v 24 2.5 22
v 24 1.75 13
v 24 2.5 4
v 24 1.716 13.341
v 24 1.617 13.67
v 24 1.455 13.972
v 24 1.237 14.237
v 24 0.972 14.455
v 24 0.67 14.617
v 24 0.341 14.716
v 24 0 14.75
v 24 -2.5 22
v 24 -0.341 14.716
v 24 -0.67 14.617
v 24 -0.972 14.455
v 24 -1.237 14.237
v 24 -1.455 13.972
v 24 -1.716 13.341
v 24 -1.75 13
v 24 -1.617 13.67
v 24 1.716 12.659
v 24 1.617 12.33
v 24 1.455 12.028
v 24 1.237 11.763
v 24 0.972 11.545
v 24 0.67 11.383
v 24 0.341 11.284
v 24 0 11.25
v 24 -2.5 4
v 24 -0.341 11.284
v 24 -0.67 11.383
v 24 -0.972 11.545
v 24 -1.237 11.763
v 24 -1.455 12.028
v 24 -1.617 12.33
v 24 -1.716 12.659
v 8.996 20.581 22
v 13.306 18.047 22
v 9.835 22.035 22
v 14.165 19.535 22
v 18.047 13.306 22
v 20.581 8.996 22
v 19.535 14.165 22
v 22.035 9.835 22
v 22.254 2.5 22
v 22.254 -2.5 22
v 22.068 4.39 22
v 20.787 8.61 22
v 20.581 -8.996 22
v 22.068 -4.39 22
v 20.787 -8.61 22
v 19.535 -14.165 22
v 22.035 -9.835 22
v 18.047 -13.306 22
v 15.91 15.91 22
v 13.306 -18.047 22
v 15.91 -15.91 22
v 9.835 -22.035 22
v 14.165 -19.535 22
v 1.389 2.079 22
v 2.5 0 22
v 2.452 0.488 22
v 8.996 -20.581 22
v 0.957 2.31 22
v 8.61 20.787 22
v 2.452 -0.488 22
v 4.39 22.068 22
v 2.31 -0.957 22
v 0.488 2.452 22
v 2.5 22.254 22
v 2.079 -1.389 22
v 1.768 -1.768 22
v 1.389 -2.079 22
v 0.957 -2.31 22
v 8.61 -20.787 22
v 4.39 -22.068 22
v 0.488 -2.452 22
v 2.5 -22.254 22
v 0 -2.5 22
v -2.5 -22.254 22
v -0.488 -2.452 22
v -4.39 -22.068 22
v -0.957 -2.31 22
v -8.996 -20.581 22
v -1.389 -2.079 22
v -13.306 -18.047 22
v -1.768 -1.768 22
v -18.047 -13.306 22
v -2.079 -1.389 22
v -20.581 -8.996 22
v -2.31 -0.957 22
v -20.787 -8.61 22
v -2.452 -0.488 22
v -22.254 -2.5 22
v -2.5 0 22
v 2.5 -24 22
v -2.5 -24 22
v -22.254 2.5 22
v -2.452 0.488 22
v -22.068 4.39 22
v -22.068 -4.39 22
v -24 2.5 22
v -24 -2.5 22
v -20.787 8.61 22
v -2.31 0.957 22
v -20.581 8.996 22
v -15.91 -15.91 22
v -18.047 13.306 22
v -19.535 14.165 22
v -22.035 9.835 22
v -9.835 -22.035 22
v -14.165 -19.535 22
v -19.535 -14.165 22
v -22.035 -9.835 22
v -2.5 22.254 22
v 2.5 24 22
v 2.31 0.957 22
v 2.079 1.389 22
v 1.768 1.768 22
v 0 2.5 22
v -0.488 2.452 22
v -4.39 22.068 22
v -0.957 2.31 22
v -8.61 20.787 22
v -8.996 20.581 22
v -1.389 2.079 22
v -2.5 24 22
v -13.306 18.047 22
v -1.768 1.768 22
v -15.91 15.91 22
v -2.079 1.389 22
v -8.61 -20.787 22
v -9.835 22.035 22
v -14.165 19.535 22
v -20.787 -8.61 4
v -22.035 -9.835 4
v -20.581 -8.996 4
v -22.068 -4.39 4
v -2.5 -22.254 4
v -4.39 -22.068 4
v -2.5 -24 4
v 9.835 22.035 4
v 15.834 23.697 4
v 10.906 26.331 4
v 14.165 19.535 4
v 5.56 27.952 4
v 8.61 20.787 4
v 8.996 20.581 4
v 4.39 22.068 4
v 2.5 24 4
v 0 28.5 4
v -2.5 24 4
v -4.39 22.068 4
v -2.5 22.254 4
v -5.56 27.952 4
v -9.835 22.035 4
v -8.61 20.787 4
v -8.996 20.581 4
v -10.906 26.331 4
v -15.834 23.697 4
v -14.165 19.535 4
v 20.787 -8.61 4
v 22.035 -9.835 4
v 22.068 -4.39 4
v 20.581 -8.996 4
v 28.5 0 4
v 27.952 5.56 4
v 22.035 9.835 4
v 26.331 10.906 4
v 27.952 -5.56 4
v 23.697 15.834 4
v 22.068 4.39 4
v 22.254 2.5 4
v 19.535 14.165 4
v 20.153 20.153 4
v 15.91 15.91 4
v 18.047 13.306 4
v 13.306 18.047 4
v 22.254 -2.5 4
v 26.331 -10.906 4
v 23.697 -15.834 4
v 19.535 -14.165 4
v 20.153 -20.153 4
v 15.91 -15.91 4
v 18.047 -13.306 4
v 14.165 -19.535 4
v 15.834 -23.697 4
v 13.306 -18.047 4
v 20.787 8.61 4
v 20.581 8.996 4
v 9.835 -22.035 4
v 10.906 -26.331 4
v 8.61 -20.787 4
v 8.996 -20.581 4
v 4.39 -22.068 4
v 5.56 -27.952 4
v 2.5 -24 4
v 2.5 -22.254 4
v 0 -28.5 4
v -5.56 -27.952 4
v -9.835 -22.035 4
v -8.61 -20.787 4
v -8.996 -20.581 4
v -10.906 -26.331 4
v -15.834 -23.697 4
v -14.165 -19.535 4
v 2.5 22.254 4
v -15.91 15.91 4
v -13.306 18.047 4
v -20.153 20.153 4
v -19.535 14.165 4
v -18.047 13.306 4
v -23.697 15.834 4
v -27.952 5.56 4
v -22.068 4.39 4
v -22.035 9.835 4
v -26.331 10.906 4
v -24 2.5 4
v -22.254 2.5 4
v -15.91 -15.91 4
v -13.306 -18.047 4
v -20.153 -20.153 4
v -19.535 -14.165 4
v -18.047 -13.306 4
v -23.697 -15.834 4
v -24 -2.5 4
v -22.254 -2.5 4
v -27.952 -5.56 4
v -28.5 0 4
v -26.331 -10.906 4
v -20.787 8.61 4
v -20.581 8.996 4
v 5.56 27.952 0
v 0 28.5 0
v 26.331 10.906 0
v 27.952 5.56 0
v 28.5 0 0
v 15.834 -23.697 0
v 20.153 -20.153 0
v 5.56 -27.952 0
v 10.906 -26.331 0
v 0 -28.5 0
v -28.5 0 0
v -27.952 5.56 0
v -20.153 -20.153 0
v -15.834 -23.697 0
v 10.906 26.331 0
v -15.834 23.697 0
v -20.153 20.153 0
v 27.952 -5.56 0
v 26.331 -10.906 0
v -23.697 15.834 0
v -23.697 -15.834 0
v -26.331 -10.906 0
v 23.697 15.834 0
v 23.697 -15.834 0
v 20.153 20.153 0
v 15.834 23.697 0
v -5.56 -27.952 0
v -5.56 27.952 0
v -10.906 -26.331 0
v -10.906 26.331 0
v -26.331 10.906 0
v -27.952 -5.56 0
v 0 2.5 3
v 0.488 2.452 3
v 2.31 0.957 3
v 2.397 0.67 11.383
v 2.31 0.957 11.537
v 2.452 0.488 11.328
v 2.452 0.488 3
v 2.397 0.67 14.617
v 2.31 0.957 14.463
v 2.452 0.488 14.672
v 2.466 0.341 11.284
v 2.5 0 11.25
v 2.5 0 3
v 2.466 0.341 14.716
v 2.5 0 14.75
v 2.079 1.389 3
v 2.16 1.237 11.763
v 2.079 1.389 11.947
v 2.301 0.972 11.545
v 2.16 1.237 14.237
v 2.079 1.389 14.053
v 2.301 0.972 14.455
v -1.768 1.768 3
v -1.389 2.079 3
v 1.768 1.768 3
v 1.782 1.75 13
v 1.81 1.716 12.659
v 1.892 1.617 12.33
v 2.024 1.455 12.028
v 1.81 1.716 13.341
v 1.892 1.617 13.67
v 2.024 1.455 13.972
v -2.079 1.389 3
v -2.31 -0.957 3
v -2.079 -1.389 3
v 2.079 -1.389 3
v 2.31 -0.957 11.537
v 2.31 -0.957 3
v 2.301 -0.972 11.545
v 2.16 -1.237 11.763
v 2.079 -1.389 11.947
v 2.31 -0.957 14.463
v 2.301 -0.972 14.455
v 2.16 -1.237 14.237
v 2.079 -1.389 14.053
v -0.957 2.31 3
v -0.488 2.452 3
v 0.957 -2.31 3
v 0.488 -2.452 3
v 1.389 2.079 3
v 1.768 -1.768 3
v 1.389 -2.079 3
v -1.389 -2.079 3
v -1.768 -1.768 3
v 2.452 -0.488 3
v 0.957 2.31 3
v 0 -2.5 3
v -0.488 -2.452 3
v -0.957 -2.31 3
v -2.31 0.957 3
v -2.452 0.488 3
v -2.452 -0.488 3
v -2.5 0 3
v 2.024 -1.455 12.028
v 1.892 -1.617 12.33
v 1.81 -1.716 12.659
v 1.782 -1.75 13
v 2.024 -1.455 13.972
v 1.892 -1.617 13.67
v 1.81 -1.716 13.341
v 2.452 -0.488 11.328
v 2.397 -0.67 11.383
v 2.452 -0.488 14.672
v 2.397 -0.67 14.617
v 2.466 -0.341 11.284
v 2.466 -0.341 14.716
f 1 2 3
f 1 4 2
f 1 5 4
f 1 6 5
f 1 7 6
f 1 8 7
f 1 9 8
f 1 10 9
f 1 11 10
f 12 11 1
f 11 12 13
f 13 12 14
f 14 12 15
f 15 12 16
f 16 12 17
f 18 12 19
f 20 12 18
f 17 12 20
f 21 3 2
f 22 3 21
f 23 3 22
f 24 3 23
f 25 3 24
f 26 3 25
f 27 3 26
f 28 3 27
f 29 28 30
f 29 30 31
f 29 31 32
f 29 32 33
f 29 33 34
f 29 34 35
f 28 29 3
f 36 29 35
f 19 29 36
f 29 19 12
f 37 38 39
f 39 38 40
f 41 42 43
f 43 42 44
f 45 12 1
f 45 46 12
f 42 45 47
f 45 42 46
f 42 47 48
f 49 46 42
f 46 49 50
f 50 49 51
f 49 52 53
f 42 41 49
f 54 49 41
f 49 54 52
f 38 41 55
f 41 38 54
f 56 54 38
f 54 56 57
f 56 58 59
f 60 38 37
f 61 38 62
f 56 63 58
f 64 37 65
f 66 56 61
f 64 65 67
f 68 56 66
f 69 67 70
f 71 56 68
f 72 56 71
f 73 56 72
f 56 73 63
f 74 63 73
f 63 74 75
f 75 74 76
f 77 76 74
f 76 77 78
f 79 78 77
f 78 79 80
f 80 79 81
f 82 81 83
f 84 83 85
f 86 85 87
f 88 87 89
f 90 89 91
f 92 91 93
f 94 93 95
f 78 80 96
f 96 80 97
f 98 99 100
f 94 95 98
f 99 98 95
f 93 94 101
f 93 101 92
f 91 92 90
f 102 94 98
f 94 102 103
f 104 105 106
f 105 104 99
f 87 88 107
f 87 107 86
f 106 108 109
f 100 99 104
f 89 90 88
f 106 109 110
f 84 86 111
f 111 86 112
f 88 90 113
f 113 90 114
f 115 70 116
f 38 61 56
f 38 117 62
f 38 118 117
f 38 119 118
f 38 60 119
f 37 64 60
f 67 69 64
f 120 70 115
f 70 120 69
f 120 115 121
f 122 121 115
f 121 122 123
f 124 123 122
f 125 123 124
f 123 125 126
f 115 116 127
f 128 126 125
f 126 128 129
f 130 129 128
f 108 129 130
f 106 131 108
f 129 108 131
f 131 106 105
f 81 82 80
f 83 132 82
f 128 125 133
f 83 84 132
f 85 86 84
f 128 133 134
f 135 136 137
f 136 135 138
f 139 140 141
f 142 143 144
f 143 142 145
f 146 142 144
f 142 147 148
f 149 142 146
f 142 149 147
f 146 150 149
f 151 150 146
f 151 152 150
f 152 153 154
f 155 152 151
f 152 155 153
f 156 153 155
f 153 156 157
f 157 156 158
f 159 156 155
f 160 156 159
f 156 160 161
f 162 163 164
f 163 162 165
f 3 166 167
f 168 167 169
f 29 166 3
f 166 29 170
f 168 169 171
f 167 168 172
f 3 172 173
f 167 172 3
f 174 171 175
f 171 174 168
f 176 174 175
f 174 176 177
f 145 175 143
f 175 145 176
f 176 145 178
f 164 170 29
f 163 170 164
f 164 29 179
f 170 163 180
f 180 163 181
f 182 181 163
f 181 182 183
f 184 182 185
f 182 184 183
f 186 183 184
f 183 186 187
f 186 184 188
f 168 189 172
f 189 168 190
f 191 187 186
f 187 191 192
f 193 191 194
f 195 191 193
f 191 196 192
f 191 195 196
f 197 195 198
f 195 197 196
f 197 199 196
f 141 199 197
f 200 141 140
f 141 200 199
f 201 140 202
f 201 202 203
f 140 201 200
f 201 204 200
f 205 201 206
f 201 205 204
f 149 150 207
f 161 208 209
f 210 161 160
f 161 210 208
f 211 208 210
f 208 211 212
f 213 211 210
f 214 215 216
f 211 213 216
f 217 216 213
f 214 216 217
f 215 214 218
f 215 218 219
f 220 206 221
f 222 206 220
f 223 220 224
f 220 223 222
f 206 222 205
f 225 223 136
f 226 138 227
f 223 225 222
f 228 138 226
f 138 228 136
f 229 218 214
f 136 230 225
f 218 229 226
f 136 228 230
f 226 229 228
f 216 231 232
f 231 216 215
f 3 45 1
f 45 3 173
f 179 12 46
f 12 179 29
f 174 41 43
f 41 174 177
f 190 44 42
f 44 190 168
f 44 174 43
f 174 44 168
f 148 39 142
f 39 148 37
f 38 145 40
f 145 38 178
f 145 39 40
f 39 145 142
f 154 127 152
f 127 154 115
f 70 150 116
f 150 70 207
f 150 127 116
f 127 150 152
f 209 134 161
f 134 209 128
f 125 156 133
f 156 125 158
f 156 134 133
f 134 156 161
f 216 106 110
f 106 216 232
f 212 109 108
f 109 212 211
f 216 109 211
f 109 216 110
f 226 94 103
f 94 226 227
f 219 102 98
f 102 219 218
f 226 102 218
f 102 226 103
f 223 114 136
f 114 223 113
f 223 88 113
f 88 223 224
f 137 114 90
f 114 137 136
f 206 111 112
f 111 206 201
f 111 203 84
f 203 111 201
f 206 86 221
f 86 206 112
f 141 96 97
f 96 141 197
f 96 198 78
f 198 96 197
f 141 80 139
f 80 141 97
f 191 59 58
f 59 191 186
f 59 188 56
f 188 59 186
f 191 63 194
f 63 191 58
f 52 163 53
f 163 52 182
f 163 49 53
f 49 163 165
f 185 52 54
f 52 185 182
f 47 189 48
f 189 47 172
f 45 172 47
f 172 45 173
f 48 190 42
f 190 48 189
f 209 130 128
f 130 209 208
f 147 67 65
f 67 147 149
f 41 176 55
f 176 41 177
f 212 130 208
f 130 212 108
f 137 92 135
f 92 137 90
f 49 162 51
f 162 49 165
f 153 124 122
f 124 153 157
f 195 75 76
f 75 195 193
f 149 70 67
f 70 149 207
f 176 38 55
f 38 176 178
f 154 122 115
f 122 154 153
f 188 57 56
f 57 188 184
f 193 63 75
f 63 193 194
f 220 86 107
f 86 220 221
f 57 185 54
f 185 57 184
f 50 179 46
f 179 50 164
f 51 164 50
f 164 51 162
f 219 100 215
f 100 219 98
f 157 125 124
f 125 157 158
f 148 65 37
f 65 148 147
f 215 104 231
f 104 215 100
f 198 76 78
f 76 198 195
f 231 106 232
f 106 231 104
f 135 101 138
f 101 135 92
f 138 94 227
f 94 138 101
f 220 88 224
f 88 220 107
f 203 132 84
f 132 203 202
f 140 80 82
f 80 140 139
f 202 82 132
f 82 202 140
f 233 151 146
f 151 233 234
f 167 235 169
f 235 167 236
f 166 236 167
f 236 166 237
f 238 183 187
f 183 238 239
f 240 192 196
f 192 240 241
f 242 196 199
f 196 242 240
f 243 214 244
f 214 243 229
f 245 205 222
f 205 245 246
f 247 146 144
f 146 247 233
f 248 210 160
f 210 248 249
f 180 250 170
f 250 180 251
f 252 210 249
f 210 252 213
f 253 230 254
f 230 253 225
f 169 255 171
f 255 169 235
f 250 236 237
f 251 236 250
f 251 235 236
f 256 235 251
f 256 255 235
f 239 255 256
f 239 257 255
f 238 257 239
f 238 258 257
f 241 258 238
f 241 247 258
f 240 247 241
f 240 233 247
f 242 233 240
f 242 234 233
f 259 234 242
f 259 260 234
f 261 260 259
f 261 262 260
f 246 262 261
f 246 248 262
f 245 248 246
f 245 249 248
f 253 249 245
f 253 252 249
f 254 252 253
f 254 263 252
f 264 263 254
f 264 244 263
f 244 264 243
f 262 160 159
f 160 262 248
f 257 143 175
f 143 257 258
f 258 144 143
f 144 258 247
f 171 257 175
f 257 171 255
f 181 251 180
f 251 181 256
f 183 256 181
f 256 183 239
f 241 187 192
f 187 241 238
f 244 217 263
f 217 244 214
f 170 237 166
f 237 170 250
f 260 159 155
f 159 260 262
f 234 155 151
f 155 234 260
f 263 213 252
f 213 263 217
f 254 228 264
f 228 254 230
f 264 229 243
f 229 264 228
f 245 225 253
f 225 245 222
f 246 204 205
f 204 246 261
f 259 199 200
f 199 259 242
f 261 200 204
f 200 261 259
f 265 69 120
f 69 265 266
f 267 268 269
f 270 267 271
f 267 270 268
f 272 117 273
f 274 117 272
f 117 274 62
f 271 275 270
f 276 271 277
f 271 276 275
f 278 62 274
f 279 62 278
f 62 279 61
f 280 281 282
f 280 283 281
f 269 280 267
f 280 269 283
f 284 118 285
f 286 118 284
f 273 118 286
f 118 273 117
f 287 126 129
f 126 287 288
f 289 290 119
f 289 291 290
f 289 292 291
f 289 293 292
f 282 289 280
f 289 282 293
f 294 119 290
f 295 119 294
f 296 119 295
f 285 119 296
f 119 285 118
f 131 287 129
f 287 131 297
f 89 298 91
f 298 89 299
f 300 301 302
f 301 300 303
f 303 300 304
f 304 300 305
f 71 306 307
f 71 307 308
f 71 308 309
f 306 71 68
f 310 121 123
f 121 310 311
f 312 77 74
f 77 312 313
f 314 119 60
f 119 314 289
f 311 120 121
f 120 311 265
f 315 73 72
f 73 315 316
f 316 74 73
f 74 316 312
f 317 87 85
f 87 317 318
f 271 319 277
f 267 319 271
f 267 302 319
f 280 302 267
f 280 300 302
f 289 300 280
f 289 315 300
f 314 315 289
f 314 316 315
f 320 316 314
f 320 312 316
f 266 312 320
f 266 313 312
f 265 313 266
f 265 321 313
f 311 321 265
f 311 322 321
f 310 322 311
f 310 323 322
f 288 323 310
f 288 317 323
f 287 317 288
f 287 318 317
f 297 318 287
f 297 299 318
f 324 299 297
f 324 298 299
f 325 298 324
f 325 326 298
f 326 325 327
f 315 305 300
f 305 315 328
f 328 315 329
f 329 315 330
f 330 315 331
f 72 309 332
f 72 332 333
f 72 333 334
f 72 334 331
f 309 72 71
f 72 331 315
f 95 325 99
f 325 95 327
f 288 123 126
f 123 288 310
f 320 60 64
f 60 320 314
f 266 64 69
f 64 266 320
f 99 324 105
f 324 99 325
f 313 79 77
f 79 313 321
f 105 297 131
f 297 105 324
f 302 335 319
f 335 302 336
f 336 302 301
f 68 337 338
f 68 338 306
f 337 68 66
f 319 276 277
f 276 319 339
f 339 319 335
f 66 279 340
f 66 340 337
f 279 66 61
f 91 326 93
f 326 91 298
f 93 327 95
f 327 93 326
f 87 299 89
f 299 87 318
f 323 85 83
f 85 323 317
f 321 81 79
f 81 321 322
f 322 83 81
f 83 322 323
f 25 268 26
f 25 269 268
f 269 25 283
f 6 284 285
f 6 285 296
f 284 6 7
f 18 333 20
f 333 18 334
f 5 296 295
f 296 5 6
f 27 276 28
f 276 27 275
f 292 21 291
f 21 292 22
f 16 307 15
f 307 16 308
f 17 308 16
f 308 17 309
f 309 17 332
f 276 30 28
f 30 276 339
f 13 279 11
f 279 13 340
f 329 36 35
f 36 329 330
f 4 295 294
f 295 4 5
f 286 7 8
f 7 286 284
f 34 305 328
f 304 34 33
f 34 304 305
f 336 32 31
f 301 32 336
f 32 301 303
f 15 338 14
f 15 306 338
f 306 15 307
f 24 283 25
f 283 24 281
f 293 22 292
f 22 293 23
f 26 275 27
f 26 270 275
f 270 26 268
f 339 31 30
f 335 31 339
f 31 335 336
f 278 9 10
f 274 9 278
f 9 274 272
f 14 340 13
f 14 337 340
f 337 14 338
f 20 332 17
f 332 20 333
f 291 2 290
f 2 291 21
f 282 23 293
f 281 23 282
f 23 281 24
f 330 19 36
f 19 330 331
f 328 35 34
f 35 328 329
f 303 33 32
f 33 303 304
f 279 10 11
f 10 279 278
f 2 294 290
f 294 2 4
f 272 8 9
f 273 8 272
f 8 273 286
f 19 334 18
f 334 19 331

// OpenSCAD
$fn = 32;

// ----------------------------------------------------------------------
// Control knob: skirt knob with grip ribs
// ----------------------------------------------------------------------

// --- parameters (mm) ---
skirt_d = 57;             // skirt diameter
skirt_t = 4;              // skirt thickness
rib_w = 5;                // grip rib width
rib_out = 2.5;            // grip rib radial protrusion
n_ribs = 12;              // number of grip ribs
knob_d = 45;              // knob body diameter
knob_h = 18;              // knob body height
bore_d = 5;               // shaft bore diameter
set_d = 3.5;              // set screw bore diameter

rib_step = 360 / n_ribs;  // rib angular step
total_h = skirt_t + knob_h;  // overall height

difference() {
  union() {
    translate([0, 0, skirt_t]) cylinder(h = knob_h, d = knob_d);
    cylinder(h = skirt_t, d = skirt_d);
    for (i = [0 : n_ribs - 1])
      rotate([0, 0, i * rib_step])
        translate([knob_d / 2 - 1, -rib_w / 2, skirt_t])
          cube([rib_out, rib_w, knob_h]);
  }
  translate([0, 0, skirt_t - 1]) cylinder(h = knob_h + 2, d = bore_d);
  translate([-1, 0, skirt_t + knob_h / 2]) rotate([0, 90, 0])
    cylinder(h = knob_d / 2 + bore_d / 2 + 2, d = set_d);
}
